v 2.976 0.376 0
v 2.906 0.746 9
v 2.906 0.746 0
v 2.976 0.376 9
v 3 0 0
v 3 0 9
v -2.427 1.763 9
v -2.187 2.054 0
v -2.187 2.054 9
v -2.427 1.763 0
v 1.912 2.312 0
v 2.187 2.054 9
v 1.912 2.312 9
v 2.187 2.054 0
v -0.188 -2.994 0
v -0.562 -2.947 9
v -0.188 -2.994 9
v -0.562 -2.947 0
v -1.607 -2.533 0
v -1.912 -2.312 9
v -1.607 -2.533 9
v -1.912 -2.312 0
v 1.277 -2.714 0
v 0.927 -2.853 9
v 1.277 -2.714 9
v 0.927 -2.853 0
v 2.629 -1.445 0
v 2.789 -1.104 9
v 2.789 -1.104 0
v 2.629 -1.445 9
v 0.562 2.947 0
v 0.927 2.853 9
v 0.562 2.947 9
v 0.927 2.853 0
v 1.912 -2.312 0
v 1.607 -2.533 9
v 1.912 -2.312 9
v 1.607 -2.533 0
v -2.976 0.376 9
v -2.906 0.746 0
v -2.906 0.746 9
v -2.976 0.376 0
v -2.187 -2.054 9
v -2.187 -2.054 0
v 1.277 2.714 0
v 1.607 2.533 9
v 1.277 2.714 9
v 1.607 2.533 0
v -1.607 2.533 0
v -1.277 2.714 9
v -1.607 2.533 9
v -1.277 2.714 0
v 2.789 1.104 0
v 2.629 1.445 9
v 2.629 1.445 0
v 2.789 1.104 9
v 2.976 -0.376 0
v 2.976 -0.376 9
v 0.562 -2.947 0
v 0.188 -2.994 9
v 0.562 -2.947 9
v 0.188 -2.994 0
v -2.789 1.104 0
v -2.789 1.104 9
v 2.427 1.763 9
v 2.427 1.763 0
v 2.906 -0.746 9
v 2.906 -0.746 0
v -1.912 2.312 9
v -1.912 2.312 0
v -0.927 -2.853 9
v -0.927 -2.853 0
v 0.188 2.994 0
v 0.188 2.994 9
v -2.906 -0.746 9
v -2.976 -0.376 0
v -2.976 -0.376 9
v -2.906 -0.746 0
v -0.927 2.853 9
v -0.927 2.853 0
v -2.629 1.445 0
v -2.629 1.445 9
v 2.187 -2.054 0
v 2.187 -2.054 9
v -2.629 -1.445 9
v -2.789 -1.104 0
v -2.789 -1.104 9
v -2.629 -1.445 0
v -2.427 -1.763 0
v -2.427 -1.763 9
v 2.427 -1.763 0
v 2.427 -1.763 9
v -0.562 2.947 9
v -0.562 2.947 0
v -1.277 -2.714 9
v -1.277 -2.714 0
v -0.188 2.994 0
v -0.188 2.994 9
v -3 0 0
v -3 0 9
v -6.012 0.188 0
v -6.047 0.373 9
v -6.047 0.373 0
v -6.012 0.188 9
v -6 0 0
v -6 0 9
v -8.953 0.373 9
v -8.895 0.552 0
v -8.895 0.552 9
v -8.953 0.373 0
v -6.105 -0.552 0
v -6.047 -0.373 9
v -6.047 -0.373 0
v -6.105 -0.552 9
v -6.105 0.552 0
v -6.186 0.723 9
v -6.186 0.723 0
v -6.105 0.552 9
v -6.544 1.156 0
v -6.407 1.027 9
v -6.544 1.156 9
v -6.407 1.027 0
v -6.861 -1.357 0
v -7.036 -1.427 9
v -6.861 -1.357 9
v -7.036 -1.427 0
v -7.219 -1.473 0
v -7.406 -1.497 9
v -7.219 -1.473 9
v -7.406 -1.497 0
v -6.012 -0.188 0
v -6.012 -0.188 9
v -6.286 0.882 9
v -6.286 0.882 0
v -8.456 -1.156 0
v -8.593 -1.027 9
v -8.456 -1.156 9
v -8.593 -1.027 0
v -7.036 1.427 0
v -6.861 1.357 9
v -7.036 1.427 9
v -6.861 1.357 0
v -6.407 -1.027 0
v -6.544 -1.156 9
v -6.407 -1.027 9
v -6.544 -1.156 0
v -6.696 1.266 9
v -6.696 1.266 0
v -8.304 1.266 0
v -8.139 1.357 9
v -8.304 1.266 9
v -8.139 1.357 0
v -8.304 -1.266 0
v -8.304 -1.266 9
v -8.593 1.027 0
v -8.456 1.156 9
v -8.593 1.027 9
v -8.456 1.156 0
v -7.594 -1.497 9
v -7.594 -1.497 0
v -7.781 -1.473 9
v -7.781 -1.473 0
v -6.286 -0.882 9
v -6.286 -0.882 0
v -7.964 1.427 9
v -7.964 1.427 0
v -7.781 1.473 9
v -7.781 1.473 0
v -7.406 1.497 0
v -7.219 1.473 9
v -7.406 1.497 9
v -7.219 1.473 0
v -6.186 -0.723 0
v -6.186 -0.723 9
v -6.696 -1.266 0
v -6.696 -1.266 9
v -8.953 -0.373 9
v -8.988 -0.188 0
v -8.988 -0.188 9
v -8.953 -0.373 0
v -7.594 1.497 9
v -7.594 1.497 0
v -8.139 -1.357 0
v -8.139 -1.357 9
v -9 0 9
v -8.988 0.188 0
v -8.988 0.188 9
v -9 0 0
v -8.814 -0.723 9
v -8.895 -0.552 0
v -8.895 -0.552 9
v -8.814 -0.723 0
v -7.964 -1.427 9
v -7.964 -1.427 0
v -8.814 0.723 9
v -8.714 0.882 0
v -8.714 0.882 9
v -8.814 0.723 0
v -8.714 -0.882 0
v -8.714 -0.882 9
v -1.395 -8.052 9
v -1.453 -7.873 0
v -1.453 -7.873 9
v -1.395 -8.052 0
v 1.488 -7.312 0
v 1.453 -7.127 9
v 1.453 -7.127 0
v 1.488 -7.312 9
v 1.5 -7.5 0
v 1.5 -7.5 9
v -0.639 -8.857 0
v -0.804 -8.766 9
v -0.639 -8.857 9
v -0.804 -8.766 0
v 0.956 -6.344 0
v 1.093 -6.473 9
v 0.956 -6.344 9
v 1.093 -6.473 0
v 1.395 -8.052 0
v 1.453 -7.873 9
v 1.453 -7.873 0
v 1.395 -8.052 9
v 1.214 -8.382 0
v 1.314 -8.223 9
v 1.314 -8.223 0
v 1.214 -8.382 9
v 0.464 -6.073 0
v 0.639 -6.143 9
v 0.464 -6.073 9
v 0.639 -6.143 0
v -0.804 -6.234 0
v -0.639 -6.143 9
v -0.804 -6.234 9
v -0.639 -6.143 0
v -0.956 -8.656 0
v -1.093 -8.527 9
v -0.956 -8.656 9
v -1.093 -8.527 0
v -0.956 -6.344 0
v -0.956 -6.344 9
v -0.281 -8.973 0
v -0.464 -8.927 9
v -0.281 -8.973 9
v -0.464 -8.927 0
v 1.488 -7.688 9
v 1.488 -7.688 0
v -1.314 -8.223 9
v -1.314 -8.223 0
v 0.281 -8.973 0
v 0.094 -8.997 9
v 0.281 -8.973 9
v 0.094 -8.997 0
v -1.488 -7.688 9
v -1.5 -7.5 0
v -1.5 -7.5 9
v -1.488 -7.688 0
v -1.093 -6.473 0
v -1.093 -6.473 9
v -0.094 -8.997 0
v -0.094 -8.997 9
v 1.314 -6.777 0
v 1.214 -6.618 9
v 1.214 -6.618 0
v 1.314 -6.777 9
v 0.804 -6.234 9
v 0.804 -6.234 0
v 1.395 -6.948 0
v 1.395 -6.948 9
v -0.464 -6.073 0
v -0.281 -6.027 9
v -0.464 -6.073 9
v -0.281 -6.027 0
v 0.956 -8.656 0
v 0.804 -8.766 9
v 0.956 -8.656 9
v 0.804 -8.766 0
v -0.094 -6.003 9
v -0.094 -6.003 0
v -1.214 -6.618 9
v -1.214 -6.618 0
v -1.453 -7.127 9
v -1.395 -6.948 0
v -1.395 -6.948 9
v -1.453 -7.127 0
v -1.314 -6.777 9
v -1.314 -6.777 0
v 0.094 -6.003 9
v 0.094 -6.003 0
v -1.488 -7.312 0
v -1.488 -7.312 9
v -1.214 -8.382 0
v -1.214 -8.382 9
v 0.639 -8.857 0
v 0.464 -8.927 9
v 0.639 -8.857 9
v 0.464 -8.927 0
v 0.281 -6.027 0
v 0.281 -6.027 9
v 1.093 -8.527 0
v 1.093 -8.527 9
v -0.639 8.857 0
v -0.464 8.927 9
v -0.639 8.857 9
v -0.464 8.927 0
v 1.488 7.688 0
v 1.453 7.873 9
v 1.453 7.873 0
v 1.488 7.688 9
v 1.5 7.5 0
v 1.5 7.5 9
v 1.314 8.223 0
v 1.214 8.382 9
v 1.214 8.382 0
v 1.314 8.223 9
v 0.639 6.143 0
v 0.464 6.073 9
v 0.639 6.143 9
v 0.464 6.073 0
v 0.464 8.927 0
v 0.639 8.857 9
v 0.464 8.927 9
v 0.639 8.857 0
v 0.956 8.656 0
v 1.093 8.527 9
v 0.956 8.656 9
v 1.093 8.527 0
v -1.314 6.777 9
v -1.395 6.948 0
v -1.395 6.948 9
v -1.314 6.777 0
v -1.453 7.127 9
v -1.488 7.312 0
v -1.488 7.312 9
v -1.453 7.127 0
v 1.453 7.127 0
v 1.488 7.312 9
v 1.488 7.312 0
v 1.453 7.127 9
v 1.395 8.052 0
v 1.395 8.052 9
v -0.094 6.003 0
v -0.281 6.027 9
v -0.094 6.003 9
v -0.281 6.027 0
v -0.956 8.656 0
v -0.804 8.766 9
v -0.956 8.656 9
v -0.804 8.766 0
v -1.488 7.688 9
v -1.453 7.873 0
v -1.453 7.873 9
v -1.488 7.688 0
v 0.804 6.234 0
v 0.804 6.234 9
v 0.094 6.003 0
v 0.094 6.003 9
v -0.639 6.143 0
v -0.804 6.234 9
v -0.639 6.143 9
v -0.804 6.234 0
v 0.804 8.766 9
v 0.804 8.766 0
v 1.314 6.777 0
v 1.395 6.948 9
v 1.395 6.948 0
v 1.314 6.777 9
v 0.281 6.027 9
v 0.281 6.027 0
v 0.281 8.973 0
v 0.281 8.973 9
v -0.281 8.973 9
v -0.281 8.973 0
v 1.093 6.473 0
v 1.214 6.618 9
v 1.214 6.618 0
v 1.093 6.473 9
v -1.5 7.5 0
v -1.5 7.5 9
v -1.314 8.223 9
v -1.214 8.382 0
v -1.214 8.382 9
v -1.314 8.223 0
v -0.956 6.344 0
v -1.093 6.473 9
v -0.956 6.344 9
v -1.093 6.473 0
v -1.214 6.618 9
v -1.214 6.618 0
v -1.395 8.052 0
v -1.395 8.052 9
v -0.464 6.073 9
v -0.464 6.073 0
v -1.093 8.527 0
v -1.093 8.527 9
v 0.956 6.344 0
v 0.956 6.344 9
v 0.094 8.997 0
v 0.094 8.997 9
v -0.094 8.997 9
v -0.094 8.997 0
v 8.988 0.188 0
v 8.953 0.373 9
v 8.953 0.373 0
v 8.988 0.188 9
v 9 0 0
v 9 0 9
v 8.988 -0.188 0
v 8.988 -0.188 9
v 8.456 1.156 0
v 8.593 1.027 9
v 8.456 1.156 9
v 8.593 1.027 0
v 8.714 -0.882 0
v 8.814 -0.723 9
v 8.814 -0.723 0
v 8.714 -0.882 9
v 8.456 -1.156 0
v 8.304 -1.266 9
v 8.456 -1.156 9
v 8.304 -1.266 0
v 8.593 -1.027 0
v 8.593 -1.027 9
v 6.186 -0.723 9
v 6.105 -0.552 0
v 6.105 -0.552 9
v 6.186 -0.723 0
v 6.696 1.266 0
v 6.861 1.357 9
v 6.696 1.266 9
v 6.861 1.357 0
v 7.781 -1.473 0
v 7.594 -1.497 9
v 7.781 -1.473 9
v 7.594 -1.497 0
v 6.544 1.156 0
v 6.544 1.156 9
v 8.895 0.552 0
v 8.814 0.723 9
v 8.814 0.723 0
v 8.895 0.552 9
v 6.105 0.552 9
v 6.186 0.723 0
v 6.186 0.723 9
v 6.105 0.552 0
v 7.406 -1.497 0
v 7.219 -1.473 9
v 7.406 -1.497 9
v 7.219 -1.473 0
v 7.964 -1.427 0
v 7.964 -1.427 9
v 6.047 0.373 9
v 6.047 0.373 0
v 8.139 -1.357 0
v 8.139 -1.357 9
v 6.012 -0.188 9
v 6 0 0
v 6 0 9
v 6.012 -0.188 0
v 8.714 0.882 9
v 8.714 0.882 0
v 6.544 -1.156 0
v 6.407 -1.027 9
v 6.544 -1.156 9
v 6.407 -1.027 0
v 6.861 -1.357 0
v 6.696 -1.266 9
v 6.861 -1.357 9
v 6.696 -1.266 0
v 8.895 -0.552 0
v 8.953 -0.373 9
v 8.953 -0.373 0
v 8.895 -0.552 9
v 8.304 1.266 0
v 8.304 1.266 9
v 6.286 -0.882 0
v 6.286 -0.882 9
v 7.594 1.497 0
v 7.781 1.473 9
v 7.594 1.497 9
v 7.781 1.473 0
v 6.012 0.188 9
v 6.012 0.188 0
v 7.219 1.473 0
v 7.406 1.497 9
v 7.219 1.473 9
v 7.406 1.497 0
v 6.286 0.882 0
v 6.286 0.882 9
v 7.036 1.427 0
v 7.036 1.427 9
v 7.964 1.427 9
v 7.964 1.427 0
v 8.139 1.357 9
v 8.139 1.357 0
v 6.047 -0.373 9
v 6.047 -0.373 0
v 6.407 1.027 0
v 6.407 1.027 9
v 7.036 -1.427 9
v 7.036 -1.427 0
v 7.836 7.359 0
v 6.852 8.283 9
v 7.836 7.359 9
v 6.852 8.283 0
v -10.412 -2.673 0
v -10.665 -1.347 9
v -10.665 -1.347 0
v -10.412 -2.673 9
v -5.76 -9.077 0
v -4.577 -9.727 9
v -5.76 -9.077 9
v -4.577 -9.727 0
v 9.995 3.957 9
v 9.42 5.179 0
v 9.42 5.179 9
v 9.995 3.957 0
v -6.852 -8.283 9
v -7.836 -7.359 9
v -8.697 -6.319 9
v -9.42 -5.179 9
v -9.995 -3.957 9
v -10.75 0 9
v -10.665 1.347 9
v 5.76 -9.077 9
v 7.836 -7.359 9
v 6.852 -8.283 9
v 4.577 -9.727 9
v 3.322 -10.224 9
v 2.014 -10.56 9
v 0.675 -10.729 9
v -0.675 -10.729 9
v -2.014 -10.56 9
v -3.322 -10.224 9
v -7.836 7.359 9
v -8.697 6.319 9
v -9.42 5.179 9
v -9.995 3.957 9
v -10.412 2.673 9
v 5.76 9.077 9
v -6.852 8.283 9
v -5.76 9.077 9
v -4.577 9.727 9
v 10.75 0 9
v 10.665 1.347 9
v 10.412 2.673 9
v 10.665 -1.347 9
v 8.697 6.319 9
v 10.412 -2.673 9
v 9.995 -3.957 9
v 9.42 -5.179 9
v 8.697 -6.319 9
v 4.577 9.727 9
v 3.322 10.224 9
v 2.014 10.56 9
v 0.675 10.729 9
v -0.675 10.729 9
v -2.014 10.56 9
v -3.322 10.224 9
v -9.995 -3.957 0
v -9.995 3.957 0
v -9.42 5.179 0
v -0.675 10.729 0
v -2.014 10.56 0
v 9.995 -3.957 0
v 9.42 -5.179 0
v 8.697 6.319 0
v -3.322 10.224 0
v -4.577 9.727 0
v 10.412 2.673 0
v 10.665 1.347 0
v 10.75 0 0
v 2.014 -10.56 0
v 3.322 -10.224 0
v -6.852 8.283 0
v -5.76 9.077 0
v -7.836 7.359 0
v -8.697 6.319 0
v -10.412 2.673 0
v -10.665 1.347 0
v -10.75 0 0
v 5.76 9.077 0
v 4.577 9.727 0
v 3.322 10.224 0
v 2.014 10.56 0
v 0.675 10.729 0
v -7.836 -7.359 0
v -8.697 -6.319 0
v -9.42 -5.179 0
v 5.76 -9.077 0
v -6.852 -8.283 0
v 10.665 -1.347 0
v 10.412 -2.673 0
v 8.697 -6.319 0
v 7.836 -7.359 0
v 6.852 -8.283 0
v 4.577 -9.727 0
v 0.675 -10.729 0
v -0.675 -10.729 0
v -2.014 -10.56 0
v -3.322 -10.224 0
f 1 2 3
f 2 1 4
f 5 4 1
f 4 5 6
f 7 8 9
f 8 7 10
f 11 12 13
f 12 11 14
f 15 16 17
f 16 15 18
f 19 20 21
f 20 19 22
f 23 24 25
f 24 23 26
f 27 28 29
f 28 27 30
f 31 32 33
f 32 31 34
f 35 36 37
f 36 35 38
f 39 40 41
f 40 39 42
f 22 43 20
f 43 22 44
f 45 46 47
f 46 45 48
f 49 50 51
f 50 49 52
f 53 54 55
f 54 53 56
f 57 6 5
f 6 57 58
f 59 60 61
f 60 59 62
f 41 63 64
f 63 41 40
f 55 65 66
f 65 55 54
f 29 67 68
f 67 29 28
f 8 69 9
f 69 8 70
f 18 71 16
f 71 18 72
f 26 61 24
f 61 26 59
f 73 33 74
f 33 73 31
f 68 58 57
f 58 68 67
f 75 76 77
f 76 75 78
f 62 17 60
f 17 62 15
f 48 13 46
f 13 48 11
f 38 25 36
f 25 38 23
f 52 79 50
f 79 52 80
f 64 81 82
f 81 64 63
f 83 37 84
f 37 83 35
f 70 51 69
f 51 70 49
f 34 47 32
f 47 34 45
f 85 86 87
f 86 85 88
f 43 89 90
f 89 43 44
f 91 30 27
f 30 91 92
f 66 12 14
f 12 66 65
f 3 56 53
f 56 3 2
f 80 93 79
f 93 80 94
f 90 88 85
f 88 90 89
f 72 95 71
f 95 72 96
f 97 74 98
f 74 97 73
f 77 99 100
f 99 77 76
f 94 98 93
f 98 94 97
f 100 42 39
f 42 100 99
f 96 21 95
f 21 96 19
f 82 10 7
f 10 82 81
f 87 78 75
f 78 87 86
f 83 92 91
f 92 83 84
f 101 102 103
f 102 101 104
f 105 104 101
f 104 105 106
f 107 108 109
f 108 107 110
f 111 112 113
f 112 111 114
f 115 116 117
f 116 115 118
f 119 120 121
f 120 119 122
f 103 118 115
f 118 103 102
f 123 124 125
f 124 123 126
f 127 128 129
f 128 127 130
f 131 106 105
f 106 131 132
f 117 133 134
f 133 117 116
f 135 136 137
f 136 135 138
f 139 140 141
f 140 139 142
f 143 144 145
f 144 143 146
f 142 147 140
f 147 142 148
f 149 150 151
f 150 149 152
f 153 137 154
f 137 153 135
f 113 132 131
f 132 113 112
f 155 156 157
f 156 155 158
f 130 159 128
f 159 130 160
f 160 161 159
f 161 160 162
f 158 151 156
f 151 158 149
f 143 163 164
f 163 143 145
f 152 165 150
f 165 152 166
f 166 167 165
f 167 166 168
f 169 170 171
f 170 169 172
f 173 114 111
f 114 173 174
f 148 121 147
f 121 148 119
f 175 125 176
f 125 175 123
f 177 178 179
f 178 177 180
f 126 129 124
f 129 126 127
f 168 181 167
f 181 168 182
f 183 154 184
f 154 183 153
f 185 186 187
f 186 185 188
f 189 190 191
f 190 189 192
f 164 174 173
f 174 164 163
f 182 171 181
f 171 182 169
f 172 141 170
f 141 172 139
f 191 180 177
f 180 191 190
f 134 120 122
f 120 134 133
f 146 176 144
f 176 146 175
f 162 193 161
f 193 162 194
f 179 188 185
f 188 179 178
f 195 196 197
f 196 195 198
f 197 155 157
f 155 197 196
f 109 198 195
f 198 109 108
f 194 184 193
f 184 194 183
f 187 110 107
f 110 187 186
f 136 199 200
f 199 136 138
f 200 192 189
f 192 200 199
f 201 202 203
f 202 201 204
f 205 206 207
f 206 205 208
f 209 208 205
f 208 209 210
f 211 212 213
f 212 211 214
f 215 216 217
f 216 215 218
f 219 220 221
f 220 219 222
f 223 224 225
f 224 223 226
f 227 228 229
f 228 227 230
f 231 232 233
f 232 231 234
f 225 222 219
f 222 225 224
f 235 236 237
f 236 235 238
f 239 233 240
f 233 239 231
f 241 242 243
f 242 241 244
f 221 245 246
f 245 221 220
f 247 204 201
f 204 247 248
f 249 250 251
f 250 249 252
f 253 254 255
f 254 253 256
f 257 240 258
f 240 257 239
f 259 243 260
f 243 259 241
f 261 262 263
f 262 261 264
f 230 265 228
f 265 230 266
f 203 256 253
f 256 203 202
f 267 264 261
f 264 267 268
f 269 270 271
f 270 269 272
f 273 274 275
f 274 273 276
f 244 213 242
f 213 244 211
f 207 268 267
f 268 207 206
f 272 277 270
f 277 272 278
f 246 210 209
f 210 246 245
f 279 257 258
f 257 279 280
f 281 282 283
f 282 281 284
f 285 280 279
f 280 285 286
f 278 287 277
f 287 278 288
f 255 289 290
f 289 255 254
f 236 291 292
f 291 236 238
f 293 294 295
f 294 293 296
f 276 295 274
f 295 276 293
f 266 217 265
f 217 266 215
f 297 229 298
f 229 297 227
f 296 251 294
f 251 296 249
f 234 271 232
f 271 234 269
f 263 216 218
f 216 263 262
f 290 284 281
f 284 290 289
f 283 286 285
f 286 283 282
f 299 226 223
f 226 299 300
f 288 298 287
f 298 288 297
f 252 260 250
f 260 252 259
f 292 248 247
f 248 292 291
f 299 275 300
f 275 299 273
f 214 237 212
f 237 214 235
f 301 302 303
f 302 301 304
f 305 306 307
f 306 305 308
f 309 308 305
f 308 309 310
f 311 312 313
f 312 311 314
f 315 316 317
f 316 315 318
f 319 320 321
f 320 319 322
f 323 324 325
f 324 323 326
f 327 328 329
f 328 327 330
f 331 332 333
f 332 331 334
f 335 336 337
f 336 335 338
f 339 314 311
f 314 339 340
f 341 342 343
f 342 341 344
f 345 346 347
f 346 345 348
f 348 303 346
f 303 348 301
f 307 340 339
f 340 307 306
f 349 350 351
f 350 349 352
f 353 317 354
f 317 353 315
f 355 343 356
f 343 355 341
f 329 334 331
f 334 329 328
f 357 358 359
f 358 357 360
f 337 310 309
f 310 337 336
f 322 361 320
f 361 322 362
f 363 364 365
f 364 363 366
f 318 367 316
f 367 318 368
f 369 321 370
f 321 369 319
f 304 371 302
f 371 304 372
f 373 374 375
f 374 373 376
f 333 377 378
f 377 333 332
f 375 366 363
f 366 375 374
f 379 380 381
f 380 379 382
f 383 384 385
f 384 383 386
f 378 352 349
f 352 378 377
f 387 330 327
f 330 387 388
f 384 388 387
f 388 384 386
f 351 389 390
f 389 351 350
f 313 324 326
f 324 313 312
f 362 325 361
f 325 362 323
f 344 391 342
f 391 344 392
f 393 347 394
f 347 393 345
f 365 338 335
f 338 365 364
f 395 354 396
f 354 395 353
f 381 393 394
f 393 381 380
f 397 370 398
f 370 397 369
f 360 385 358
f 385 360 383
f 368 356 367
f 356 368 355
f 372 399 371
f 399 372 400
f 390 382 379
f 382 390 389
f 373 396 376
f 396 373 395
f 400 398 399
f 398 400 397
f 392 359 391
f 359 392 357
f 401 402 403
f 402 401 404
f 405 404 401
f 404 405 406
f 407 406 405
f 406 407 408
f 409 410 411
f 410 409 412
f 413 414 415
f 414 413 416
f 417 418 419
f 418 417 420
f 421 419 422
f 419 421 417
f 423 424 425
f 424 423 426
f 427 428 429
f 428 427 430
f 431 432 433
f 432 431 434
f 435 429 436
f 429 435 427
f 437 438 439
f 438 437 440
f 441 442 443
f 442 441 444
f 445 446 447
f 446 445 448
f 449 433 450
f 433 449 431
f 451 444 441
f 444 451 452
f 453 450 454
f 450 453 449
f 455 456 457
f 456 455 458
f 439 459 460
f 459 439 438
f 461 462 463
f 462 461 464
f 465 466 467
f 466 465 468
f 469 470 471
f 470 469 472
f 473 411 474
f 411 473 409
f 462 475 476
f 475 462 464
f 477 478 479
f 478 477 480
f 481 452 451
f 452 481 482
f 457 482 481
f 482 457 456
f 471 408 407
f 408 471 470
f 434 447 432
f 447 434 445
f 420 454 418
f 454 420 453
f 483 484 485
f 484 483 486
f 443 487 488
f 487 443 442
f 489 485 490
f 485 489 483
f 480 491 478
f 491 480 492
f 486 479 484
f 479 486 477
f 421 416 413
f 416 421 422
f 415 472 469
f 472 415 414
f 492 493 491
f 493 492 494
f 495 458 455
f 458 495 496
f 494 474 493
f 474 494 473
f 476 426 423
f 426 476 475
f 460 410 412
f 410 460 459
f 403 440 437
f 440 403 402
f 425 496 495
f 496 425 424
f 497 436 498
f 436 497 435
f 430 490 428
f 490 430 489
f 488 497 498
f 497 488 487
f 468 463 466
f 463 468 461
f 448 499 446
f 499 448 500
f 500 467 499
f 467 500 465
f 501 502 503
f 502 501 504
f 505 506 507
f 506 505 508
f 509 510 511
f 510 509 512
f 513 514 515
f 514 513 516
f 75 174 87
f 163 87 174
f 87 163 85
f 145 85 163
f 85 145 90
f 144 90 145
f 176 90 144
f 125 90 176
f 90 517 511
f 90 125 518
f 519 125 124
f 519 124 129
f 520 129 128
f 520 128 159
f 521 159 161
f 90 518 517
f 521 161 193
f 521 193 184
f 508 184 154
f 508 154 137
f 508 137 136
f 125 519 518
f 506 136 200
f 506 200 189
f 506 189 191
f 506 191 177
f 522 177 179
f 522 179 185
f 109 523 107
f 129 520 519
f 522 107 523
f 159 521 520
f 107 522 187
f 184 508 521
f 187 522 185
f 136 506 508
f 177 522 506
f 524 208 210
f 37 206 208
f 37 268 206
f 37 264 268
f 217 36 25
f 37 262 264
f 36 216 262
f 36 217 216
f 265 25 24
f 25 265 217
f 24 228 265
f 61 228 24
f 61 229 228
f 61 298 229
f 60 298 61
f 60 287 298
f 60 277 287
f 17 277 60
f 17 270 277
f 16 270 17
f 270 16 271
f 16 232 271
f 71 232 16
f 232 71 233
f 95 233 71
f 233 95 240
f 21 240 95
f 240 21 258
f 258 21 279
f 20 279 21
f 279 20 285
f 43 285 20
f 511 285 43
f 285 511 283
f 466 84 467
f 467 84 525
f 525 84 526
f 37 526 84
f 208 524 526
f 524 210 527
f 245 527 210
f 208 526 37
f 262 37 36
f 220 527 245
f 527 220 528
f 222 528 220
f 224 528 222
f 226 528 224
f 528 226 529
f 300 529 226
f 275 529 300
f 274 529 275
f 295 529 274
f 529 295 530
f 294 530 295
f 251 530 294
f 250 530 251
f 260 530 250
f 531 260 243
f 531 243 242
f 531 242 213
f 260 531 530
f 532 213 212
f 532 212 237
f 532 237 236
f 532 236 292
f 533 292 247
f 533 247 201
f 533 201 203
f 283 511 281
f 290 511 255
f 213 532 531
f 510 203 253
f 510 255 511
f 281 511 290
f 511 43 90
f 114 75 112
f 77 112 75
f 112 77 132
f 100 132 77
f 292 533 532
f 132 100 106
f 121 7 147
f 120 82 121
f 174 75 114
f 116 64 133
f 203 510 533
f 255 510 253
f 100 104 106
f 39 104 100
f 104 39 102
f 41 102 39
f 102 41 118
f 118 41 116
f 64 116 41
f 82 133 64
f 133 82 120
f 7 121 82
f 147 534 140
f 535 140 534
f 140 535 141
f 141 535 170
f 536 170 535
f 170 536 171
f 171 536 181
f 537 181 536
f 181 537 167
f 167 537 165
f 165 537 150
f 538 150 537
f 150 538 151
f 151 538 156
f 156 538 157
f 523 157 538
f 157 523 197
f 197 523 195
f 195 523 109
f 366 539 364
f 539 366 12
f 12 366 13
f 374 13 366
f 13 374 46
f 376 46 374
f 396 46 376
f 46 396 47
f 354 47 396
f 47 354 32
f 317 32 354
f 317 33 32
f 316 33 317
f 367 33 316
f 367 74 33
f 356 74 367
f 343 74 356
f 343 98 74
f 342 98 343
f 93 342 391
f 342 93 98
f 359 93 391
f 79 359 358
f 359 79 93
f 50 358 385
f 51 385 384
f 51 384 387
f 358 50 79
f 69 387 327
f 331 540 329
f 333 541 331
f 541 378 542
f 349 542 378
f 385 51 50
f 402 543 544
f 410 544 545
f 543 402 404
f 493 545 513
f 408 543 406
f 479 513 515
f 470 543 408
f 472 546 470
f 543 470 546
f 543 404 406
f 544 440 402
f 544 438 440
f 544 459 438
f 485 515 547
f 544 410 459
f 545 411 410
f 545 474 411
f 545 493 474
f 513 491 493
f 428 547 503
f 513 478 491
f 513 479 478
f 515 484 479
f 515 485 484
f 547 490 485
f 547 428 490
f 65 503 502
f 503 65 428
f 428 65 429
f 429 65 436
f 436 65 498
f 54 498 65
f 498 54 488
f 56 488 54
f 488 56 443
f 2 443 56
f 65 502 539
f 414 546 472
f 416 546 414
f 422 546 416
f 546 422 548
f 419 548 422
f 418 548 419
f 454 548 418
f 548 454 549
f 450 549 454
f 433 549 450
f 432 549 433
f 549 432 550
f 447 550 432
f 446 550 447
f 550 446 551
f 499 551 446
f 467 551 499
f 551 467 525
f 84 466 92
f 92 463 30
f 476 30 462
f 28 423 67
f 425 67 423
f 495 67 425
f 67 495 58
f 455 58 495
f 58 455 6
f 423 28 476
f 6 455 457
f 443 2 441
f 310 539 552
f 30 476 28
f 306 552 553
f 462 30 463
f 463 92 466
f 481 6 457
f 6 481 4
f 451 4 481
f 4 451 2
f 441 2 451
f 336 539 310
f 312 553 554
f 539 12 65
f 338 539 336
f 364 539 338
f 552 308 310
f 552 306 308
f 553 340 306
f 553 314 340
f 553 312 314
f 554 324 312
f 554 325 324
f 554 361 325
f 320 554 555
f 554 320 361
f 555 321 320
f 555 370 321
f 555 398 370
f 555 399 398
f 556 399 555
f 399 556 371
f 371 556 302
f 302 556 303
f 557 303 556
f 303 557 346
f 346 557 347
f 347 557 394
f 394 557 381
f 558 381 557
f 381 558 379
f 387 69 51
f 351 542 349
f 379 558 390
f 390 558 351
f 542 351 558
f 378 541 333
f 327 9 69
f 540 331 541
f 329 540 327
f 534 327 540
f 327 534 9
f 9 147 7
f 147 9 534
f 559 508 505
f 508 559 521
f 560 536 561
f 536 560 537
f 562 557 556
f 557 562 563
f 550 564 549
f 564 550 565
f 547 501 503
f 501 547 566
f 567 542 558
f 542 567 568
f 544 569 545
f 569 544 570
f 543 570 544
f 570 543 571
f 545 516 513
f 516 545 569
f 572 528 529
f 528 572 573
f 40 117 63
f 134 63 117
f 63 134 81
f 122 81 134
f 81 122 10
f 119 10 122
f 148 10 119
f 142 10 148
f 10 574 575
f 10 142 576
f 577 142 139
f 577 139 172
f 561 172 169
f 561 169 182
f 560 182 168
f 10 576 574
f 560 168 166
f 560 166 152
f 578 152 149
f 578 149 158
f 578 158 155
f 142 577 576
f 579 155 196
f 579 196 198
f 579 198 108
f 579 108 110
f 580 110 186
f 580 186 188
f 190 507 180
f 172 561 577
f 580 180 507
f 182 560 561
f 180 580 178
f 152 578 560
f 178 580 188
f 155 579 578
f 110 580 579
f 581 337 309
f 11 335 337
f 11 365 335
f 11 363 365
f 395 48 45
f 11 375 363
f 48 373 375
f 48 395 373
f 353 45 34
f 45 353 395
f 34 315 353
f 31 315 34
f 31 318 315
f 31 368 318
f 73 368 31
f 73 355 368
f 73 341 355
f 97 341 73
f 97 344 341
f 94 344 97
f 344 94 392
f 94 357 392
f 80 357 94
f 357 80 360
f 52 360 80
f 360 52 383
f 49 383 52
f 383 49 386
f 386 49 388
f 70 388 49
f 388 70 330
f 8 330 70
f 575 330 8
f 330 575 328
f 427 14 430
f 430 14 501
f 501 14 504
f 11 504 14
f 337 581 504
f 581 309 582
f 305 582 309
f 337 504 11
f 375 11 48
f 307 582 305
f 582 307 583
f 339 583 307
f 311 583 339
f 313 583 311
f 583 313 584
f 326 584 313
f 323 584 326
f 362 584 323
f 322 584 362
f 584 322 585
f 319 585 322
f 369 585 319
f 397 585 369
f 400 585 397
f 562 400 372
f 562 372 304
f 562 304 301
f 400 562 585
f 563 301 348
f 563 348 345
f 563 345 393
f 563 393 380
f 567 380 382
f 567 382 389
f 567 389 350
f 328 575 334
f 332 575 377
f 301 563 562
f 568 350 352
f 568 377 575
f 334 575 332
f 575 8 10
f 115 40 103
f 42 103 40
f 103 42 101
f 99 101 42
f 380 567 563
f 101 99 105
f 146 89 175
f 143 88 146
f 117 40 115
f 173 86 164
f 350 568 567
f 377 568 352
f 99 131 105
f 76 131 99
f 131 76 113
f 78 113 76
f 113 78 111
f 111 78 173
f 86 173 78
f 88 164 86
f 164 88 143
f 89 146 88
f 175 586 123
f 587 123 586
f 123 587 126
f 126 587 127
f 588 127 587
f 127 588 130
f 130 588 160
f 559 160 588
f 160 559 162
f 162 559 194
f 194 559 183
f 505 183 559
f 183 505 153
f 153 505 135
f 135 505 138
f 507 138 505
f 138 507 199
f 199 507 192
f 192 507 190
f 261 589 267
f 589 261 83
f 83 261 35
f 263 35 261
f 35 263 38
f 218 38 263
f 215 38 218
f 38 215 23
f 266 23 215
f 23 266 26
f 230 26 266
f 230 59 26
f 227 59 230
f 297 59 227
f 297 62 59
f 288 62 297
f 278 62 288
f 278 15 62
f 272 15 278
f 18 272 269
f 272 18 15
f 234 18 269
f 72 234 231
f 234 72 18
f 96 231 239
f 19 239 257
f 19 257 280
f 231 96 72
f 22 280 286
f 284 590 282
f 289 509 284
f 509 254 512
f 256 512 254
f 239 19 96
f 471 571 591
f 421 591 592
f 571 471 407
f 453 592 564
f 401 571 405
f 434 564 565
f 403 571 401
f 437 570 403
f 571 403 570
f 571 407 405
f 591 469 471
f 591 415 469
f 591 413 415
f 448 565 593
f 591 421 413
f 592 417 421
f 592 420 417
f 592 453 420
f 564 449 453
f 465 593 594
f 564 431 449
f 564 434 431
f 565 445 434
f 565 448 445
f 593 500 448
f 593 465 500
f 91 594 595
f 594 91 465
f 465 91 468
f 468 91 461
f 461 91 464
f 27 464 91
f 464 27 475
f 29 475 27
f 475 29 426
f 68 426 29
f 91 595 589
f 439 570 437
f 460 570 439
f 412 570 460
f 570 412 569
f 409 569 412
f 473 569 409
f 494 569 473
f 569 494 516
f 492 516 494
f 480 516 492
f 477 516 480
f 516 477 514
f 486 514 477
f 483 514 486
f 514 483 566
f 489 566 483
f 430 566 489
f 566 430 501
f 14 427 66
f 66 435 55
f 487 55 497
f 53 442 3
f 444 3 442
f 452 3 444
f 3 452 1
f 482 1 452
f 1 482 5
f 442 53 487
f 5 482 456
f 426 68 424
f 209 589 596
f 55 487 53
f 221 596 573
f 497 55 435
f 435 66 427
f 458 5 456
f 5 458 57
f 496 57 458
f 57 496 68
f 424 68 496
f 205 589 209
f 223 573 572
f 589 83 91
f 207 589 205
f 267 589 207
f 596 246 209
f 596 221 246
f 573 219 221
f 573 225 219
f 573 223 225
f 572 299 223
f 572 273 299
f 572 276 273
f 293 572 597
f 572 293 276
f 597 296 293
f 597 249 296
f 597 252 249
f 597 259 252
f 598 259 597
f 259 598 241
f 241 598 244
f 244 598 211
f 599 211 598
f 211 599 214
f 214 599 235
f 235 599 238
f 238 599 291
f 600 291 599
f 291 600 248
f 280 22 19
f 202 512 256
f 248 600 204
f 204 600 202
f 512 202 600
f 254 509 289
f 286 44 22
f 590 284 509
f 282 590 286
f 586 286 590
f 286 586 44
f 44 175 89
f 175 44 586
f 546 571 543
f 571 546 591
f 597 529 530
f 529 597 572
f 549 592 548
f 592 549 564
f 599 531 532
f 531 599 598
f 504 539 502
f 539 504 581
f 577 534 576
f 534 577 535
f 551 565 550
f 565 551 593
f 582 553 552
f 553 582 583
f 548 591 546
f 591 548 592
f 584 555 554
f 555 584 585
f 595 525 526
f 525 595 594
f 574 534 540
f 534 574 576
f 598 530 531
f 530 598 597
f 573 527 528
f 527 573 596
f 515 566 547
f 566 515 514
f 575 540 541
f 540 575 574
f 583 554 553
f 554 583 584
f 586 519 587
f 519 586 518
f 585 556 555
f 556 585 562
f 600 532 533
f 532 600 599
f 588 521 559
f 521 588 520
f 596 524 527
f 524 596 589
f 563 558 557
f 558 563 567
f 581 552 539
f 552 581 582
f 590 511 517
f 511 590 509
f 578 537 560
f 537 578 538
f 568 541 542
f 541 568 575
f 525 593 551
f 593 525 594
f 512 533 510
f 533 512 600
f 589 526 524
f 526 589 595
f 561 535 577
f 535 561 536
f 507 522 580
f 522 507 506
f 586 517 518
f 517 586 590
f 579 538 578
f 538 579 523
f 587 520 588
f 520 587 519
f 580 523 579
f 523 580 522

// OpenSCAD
$fn = 50;


difference() {
	union() {
		*color(alpha = 1.0000000000, c = "gray") {
			translate(v = [0, 7, 0]) {
				linear_extrude(height = 1) {
					text(font = "Arial:style=Bold", halign = "center", size = 4.5000000000, text = "COMMENT circle main", valign = "center");
				}
			}
		}
		*color(alpha = 1.0000000000, c = "gray") {
			translate(v = [0, 14, 0]) {
				linear_extrude(height = 1.5000000000) {
					text(font = "Arial:style=Bold", halign = "center", size = 4.5000000000, text = "COMMENT description oobb_circle_shape_p_type_9_depth_1.5_diameter_9_thickness_1.5_width_1.5_height", valign = "center");
				}
			}
		}
		cylinder(h = 9, r = 10.7500000000);
	}
	union() {
		*color(alpha = 1.0000000000, c = "gray") {
			translate(v = [0, 7, 0]) {
				linear_extrude(height = 1) {
					text(font = "Arial:style=Bold", halign = "center", size = 4.5000000000, text = "COMMENT holes main", valign = "center");
				}
			}
		}
		*color(alpha = 1.0000000000, c = "gray") {
			translate(v = [0, 14, 0]) {
				linear_extrude(height = 1.5000000000) {
					text(font = "Arial:style=Bold", halign = "center", size = 4.5000000000, text = "COMMENT description oobb_holes_shape_n_type_1.5_diameter_9_thickness_1.5_width_1.5_height_true_both_holes_true_circle", valign = "center");
				}
			}
		}
		translate(v = [0.0000000000, 0.0000000000, -50.0000000000]) {
			cylinder(h = 100, r = 3.0000000000);
		}
		translate(v = [0.0000000000, 0.0000000000, -50.0000000000]) {
			cylinder(h = 100, r = 3.0000000000);
		}
		translate(v = [0.0000000000, 0.0000000000, -50.0000000000]) {
			cylinder(h = 100, r = 3.0000000000);
		}
		translate(v = [-7.5000000000, 0.0000000000, -50.0000000000]) {
			cylinder(h = 100, r = 1.5000000000);
		}
		translate(v = [0.0000000000, -7.5000000000, -50.0000000000]) {
			cylinder(h = 100, r = 1.5000000000);
		}
		translate(v = [0.0000000000, 0.0000000000, -50.0000000000]) {
			cylinder(h = 100, r = 1.5000000000);
		}
		translate(v = [0.0000000000, 7.5000000000, -50.0000000000]) {
			cylinder(h = 100, r = 1.5000000000);
		}
		translate(v = [7.5000000000, 0.0000000000, -50.0000000000]) {
			cylinder(h = 100, r = 1.5000000000);
		}
		translate(v = [-7.5000000000, 0.0000000000, -50.0000000000]) {
			cylinder(h = 100, r = 1.5000000000);
		}
		translate(v = [0.0000000000, -7.5000000000, -50.0000000000]) {
			cylinder(h = 100, r = 1.5000000000);
		}
		translate(v = [0.0000000000, 0.0000000000, -50.0000000000]) {
			cylinder(h = 100, r = 1.5000000000);
		}
		translate(v = [0.0000000000, 7.5000000000, -50.0000000000]) {
			cylinder(h = 100, r = 1.5000000000);
		}
		translate(v = [7.5000000000, 0.0000000000, -50.0000000000]) {
			cylinder(h = 100, r = 1.5000000000);
		}
		translate(v = [-7.5000000000, 0.0000000000, -50.0000000000]) {
			cylinder(h = 100, r = 1.5000000000);
		}
		translate(v = [0.0000000000, -7.5000000000, -50.0000000000]) {
			cylinder(h = 100, r = 1.5000000000);
		}
		translate(v = [0.0000000000, 0.0000000000, -50.0000000000]) {
			cylinder(h = 100, r = 1.5000000000);
		}
		translate(v = [0.0000000000, 7.5000000000, -50.0000000000]) {
			cylinder(h = 100, r = 1.5000000000);
		}
		translate(v = [7.5000000000, 0.0000000000, -50.0000000000]) {
			cylinder(h = 100, r = 1.5000000000);
		}
	}
}
